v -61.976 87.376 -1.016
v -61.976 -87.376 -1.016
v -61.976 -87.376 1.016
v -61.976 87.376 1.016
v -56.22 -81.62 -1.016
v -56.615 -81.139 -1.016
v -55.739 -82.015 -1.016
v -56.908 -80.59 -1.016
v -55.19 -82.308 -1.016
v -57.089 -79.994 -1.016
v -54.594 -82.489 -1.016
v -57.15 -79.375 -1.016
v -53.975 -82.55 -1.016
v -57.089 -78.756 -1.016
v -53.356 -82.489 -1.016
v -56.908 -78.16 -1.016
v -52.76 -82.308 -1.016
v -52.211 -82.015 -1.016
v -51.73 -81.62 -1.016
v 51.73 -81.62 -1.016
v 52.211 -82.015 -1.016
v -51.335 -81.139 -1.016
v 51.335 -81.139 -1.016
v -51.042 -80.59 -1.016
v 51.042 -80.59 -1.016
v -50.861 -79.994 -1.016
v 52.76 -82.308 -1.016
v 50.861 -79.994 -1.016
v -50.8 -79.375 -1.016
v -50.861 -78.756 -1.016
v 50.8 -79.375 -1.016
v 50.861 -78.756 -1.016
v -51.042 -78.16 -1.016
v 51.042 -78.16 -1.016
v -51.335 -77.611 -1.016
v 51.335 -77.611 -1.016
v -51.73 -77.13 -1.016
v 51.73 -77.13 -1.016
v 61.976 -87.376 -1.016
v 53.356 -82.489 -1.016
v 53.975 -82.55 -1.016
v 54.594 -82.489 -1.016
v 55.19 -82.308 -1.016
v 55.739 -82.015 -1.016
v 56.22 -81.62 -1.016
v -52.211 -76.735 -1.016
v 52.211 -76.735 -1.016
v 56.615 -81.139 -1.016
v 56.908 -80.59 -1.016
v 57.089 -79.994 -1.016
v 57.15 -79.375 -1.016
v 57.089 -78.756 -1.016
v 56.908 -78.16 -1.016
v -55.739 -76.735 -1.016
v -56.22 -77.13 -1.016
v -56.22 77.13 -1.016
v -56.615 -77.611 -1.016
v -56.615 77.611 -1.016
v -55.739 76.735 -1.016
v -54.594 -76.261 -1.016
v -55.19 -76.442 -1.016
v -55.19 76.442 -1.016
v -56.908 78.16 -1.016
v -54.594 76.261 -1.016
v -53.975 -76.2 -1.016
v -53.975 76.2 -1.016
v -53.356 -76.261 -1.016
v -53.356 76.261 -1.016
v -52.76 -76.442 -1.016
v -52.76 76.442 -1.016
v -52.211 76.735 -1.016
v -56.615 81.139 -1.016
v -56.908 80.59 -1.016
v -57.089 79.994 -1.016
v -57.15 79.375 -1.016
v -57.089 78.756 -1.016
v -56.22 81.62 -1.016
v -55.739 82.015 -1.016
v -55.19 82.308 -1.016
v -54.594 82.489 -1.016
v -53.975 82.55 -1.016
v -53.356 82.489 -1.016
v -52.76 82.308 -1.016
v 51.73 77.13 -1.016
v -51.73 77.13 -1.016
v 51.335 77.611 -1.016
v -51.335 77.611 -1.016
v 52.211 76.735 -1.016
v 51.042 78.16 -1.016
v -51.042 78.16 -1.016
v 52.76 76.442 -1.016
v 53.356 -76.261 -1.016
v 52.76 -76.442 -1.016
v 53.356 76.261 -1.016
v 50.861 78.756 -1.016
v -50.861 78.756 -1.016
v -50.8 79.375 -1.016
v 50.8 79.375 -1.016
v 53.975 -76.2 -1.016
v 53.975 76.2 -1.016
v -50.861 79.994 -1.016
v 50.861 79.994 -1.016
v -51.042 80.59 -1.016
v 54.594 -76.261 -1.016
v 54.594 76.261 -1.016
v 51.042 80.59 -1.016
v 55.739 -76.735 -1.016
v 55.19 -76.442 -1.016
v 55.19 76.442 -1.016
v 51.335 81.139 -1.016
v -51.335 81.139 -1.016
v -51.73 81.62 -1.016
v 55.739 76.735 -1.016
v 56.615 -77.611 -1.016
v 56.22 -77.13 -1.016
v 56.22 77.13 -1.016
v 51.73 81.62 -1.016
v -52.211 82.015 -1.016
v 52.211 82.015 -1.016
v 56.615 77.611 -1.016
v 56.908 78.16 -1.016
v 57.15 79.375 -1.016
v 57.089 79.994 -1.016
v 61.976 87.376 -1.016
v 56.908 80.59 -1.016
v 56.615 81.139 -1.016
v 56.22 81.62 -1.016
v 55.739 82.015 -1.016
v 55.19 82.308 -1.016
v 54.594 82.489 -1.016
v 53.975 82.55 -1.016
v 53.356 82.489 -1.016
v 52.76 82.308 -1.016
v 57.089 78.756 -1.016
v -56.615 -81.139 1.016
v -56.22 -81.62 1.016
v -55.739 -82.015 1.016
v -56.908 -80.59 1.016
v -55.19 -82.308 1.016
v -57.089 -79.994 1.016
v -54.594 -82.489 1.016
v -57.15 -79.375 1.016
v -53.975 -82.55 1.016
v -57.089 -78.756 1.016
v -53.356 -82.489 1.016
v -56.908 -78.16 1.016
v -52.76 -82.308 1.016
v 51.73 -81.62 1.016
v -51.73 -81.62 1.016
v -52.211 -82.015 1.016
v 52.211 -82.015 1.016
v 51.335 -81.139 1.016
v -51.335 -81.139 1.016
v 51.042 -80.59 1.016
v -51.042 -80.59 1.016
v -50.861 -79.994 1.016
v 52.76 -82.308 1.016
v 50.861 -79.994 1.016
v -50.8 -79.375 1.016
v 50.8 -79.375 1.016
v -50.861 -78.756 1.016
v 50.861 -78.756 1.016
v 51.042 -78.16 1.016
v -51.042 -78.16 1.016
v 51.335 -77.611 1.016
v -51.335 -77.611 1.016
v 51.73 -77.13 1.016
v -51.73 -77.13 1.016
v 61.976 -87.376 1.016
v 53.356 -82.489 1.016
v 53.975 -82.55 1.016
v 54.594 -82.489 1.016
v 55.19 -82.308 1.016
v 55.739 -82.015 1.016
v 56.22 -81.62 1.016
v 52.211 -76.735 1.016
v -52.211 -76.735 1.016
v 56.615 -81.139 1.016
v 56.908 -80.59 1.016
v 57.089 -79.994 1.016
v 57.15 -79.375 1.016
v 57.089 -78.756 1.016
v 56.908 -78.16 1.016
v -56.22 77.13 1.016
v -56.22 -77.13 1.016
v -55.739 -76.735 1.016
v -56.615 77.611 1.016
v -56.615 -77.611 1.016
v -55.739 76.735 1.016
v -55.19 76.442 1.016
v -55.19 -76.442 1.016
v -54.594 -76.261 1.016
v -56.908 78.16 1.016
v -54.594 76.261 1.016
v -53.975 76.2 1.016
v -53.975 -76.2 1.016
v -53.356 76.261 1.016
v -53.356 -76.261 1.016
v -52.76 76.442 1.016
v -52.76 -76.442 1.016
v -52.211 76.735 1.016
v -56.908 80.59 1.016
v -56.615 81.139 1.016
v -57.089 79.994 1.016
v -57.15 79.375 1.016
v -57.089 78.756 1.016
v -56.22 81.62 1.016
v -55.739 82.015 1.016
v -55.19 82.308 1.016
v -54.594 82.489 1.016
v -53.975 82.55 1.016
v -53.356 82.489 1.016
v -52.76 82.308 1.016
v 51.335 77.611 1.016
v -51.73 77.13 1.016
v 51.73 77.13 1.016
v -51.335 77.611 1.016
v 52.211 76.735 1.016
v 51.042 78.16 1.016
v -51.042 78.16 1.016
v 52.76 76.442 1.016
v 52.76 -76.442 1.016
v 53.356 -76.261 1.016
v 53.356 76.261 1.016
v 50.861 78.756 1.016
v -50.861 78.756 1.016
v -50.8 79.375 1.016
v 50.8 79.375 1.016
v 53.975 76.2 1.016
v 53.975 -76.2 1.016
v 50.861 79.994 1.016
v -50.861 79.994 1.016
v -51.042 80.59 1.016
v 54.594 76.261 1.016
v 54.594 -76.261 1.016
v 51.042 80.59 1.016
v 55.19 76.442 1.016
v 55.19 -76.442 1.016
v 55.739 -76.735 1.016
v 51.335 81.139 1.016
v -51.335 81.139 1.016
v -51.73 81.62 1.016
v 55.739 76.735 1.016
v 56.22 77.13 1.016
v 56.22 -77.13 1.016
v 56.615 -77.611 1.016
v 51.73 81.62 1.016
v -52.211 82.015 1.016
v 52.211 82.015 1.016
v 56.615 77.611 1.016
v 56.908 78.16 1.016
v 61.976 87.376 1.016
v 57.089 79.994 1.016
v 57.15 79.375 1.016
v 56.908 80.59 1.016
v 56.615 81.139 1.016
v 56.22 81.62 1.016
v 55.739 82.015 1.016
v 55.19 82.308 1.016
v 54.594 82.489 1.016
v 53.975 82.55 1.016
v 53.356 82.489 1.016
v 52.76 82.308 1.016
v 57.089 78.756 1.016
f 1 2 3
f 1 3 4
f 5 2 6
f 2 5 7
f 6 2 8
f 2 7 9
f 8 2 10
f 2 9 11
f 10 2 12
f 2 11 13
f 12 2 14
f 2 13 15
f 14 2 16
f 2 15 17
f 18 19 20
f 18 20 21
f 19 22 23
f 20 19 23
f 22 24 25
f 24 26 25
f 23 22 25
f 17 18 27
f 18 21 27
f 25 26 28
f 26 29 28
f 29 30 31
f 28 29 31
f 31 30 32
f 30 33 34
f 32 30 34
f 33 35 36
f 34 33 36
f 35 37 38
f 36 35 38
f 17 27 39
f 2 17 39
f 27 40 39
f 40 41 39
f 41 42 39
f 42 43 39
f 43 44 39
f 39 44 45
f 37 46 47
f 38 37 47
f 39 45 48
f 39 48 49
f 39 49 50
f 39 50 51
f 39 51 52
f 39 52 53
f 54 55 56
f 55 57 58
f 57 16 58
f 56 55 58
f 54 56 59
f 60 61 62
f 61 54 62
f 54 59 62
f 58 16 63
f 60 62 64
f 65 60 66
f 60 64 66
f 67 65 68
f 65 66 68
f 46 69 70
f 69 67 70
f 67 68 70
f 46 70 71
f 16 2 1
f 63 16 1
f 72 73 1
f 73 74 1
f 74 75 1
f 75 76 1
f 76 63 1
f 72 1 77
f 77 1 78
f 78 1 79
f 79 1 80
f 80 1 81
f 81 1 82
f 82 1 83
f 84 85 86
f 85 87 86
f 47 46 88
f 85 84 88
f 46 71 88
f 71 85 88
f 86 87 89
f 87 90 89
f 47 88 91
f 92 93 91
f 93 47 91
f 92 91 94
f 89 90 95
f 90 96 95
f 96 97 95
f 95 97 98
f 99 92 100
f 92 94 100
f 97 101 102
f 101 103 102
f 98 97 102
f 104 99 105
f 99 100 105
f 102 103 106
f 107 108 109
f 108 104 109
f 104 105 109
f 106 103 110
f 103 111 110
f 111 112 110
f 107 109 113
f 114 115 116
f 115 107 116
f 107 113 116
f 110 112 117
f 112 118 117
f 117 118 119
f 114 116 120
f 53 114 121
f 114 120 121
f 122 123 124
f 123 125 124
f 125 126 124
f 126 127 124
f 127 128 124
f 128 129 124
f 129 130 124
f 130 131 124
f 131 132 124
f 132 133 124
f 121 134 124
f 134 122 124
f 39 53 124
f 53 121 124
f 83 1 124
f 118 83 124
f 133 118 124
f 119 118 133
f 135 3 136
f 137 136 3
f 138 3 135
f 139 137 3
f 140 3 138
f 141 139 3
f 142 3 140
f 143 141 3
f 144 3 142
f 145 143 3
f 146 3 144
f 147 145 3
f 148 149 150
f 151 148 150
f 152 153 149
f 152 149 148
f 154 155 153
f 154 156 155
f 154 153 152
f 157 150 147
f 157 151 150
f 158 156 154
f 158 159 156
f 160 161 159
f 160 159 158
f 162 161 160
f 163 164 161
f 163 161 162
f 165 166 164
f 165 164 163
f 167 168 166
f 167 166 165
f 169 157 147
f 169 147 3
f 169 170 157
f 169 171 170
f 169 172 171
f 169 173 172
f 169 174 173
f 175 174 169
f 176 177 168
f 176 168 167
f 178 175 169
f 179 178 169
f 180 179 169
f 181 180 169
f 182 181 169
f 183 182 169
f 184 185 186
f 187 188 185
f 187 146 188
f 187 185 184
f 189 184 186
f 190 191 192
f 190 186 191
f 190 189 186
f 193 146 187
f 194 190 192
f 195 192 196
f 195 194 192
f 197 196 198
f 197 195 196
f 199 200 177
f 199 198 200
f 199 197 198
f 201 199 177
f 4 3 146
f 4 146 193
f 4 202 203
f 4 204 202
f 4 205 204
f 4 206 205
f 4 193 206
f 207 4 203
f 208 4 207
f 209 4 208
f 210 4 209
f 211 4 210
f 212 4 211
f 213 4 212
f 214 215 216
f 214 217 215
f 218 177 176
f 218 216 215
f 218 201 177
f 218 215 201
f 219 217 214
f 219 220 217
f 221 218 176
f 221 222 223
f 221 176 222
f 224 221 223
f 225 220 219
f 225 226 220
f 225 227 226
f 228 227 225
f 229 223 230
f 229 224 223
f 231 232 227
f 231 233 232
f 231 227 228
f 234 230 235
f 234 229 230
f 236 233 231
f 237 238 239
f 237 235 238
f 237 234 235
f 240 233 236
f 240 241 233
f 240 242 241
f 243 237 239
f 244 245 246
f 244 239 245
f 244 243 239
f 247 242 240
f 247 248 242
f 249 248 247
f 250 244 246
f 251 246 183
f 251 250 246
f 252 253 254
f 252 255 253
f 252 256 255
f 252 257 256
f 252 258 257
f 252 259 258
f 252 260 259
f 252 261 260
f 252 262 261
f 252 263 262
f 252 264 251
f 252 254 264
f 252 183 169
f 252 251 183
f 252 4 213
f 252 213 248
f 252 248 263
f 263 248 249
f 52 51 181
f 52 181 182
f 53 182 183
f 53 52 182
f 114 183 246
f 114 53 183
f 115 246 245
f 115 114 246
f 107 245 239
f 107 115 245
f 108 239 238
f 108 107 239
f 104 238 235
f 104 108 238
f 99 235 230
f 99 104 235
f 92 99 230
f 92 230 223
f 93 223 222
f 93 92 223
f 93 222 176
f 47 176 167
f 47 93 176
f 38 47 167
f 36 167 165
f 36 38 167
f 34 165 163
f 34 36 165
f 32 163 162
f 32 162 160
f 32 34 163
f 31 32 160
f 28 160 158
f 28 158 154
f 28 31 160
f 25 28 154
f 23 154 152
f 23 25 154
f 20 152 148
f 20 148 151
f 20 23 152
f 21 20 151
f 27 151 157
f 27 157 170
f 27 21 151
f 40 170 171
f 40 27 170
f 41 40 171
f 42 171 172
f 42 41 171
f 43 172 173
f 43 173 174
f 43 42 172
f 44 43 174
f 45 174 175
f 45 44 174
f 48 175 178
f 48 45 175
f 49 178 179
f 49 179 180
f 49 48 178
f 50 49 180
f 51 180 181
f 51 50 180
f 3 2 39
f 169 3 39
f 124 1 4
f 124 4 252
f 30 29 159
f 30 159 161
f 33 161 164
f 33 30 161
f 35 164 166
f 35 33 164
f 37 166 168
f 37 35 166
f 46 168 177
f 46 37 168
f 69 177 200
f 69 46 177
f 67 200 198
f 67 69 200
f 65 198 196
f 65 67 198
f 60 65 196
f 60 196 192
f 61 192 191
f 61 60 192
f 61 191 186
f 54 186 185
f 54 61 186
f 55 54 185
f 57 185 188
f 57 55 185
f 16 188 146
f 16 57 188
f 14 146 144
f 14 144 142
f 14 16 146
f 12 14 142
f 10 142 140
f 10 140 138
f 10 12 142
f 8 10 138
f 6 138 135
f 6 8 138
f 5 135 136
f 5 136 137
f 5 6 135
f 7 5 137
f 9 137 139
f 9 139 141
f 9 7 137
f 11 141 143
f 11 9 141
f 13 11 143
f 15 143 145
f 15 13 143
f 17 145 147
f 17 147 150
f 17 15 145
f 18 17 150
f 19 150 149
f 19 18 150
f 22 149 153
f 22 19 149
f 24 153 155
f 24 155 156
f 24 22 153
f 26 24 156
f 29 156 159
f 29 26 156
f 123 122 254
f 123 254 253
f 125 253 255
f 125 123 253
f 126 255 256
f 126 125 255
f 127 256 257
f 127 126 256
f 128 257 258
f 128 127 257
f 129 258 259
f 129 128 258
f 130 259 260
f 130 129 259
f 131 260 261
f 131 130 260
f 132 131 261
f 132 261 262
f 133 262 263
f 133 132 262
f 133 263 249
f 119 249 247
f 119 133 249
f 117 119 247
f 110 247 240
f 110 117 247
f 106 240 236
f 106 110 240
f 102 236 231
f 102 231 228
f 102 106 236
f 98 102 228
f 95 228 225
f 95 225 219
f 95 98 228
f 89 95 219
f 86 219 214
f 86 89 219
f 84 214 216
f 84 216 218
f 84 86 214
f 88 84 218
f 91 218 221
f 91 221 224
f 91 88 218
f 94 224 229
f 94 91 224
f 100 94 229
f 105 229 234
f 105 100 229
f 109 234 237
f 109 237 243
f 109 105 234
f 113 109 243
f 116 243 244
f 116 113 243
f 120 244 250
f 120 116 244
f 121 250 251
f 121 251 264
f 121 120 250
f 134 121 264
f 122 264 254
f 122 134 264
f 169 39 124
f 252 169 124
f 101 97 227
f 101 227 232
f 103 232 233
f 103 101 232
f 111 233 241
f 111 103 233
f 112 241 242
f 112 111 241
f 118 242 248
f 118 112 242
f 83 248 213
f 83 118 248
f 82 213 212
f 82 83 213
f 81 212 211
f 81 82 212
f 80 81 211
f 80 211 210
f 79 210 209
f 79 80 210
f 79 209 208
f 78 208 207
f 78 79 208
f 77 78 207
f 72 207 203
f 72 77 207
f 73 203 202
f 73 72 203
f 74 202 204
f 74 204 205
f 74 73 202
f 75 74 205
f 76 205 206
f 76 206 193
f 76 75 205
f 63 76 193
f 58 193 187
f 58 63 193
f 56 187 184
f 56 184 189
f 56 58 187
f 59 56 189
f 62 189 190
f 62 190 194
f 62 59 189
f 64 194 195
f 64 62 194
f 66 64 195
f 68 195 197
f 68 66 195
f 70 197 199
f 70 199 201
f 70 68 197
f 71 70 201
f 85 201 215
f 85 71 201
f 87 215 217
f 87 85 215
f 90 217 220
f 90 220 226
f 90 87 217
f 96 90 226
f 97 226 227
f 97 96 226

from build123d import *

# Parameters (mm, degrees)
BOSS_EXTRUDE1_DEPTH      = 1.016
BOSS_EXTRUDE1_DEPTH_BACK = 1.016
SKETCH3_W                = 123.952
SKETCH3_H                = 174.752
SKETCH3_R                = 3.175


with BuildPart() as part:
    # Sketch3 → Boss-Extrude1 (new, two sides: drawn at the far end of the back side and taken through both)
    with BuildSketch(Plane.XY.offset(-BOSS_EXTRUDE1_DEPTH_BACK)):
        Rectangle(SKETCH3_W, SKETCH3_H)
        with Locations((-53.975, 79.375)):
            Circle(SKETCH3_R, mode=Mode.SUBTRACT)
        with Locations((53.975, 79.375)):
            Circle(SKETCH3_R, mode=Mode.SUBTRACT)
        with Locations((-53.975, -79.375)):
            Circle(SKETCH3_R, mode=Mode.SUBTRACT)
        with Locations((53.975, -79.375)):
            Circle(SKETCH3_R, mode=Mode.SUBTRACT)
    extrude(amount=BOSS_EXTRUDE1_DEPTH + BOSS_EXTRUDE1_DEPTH_BACK)


solid = part.part
